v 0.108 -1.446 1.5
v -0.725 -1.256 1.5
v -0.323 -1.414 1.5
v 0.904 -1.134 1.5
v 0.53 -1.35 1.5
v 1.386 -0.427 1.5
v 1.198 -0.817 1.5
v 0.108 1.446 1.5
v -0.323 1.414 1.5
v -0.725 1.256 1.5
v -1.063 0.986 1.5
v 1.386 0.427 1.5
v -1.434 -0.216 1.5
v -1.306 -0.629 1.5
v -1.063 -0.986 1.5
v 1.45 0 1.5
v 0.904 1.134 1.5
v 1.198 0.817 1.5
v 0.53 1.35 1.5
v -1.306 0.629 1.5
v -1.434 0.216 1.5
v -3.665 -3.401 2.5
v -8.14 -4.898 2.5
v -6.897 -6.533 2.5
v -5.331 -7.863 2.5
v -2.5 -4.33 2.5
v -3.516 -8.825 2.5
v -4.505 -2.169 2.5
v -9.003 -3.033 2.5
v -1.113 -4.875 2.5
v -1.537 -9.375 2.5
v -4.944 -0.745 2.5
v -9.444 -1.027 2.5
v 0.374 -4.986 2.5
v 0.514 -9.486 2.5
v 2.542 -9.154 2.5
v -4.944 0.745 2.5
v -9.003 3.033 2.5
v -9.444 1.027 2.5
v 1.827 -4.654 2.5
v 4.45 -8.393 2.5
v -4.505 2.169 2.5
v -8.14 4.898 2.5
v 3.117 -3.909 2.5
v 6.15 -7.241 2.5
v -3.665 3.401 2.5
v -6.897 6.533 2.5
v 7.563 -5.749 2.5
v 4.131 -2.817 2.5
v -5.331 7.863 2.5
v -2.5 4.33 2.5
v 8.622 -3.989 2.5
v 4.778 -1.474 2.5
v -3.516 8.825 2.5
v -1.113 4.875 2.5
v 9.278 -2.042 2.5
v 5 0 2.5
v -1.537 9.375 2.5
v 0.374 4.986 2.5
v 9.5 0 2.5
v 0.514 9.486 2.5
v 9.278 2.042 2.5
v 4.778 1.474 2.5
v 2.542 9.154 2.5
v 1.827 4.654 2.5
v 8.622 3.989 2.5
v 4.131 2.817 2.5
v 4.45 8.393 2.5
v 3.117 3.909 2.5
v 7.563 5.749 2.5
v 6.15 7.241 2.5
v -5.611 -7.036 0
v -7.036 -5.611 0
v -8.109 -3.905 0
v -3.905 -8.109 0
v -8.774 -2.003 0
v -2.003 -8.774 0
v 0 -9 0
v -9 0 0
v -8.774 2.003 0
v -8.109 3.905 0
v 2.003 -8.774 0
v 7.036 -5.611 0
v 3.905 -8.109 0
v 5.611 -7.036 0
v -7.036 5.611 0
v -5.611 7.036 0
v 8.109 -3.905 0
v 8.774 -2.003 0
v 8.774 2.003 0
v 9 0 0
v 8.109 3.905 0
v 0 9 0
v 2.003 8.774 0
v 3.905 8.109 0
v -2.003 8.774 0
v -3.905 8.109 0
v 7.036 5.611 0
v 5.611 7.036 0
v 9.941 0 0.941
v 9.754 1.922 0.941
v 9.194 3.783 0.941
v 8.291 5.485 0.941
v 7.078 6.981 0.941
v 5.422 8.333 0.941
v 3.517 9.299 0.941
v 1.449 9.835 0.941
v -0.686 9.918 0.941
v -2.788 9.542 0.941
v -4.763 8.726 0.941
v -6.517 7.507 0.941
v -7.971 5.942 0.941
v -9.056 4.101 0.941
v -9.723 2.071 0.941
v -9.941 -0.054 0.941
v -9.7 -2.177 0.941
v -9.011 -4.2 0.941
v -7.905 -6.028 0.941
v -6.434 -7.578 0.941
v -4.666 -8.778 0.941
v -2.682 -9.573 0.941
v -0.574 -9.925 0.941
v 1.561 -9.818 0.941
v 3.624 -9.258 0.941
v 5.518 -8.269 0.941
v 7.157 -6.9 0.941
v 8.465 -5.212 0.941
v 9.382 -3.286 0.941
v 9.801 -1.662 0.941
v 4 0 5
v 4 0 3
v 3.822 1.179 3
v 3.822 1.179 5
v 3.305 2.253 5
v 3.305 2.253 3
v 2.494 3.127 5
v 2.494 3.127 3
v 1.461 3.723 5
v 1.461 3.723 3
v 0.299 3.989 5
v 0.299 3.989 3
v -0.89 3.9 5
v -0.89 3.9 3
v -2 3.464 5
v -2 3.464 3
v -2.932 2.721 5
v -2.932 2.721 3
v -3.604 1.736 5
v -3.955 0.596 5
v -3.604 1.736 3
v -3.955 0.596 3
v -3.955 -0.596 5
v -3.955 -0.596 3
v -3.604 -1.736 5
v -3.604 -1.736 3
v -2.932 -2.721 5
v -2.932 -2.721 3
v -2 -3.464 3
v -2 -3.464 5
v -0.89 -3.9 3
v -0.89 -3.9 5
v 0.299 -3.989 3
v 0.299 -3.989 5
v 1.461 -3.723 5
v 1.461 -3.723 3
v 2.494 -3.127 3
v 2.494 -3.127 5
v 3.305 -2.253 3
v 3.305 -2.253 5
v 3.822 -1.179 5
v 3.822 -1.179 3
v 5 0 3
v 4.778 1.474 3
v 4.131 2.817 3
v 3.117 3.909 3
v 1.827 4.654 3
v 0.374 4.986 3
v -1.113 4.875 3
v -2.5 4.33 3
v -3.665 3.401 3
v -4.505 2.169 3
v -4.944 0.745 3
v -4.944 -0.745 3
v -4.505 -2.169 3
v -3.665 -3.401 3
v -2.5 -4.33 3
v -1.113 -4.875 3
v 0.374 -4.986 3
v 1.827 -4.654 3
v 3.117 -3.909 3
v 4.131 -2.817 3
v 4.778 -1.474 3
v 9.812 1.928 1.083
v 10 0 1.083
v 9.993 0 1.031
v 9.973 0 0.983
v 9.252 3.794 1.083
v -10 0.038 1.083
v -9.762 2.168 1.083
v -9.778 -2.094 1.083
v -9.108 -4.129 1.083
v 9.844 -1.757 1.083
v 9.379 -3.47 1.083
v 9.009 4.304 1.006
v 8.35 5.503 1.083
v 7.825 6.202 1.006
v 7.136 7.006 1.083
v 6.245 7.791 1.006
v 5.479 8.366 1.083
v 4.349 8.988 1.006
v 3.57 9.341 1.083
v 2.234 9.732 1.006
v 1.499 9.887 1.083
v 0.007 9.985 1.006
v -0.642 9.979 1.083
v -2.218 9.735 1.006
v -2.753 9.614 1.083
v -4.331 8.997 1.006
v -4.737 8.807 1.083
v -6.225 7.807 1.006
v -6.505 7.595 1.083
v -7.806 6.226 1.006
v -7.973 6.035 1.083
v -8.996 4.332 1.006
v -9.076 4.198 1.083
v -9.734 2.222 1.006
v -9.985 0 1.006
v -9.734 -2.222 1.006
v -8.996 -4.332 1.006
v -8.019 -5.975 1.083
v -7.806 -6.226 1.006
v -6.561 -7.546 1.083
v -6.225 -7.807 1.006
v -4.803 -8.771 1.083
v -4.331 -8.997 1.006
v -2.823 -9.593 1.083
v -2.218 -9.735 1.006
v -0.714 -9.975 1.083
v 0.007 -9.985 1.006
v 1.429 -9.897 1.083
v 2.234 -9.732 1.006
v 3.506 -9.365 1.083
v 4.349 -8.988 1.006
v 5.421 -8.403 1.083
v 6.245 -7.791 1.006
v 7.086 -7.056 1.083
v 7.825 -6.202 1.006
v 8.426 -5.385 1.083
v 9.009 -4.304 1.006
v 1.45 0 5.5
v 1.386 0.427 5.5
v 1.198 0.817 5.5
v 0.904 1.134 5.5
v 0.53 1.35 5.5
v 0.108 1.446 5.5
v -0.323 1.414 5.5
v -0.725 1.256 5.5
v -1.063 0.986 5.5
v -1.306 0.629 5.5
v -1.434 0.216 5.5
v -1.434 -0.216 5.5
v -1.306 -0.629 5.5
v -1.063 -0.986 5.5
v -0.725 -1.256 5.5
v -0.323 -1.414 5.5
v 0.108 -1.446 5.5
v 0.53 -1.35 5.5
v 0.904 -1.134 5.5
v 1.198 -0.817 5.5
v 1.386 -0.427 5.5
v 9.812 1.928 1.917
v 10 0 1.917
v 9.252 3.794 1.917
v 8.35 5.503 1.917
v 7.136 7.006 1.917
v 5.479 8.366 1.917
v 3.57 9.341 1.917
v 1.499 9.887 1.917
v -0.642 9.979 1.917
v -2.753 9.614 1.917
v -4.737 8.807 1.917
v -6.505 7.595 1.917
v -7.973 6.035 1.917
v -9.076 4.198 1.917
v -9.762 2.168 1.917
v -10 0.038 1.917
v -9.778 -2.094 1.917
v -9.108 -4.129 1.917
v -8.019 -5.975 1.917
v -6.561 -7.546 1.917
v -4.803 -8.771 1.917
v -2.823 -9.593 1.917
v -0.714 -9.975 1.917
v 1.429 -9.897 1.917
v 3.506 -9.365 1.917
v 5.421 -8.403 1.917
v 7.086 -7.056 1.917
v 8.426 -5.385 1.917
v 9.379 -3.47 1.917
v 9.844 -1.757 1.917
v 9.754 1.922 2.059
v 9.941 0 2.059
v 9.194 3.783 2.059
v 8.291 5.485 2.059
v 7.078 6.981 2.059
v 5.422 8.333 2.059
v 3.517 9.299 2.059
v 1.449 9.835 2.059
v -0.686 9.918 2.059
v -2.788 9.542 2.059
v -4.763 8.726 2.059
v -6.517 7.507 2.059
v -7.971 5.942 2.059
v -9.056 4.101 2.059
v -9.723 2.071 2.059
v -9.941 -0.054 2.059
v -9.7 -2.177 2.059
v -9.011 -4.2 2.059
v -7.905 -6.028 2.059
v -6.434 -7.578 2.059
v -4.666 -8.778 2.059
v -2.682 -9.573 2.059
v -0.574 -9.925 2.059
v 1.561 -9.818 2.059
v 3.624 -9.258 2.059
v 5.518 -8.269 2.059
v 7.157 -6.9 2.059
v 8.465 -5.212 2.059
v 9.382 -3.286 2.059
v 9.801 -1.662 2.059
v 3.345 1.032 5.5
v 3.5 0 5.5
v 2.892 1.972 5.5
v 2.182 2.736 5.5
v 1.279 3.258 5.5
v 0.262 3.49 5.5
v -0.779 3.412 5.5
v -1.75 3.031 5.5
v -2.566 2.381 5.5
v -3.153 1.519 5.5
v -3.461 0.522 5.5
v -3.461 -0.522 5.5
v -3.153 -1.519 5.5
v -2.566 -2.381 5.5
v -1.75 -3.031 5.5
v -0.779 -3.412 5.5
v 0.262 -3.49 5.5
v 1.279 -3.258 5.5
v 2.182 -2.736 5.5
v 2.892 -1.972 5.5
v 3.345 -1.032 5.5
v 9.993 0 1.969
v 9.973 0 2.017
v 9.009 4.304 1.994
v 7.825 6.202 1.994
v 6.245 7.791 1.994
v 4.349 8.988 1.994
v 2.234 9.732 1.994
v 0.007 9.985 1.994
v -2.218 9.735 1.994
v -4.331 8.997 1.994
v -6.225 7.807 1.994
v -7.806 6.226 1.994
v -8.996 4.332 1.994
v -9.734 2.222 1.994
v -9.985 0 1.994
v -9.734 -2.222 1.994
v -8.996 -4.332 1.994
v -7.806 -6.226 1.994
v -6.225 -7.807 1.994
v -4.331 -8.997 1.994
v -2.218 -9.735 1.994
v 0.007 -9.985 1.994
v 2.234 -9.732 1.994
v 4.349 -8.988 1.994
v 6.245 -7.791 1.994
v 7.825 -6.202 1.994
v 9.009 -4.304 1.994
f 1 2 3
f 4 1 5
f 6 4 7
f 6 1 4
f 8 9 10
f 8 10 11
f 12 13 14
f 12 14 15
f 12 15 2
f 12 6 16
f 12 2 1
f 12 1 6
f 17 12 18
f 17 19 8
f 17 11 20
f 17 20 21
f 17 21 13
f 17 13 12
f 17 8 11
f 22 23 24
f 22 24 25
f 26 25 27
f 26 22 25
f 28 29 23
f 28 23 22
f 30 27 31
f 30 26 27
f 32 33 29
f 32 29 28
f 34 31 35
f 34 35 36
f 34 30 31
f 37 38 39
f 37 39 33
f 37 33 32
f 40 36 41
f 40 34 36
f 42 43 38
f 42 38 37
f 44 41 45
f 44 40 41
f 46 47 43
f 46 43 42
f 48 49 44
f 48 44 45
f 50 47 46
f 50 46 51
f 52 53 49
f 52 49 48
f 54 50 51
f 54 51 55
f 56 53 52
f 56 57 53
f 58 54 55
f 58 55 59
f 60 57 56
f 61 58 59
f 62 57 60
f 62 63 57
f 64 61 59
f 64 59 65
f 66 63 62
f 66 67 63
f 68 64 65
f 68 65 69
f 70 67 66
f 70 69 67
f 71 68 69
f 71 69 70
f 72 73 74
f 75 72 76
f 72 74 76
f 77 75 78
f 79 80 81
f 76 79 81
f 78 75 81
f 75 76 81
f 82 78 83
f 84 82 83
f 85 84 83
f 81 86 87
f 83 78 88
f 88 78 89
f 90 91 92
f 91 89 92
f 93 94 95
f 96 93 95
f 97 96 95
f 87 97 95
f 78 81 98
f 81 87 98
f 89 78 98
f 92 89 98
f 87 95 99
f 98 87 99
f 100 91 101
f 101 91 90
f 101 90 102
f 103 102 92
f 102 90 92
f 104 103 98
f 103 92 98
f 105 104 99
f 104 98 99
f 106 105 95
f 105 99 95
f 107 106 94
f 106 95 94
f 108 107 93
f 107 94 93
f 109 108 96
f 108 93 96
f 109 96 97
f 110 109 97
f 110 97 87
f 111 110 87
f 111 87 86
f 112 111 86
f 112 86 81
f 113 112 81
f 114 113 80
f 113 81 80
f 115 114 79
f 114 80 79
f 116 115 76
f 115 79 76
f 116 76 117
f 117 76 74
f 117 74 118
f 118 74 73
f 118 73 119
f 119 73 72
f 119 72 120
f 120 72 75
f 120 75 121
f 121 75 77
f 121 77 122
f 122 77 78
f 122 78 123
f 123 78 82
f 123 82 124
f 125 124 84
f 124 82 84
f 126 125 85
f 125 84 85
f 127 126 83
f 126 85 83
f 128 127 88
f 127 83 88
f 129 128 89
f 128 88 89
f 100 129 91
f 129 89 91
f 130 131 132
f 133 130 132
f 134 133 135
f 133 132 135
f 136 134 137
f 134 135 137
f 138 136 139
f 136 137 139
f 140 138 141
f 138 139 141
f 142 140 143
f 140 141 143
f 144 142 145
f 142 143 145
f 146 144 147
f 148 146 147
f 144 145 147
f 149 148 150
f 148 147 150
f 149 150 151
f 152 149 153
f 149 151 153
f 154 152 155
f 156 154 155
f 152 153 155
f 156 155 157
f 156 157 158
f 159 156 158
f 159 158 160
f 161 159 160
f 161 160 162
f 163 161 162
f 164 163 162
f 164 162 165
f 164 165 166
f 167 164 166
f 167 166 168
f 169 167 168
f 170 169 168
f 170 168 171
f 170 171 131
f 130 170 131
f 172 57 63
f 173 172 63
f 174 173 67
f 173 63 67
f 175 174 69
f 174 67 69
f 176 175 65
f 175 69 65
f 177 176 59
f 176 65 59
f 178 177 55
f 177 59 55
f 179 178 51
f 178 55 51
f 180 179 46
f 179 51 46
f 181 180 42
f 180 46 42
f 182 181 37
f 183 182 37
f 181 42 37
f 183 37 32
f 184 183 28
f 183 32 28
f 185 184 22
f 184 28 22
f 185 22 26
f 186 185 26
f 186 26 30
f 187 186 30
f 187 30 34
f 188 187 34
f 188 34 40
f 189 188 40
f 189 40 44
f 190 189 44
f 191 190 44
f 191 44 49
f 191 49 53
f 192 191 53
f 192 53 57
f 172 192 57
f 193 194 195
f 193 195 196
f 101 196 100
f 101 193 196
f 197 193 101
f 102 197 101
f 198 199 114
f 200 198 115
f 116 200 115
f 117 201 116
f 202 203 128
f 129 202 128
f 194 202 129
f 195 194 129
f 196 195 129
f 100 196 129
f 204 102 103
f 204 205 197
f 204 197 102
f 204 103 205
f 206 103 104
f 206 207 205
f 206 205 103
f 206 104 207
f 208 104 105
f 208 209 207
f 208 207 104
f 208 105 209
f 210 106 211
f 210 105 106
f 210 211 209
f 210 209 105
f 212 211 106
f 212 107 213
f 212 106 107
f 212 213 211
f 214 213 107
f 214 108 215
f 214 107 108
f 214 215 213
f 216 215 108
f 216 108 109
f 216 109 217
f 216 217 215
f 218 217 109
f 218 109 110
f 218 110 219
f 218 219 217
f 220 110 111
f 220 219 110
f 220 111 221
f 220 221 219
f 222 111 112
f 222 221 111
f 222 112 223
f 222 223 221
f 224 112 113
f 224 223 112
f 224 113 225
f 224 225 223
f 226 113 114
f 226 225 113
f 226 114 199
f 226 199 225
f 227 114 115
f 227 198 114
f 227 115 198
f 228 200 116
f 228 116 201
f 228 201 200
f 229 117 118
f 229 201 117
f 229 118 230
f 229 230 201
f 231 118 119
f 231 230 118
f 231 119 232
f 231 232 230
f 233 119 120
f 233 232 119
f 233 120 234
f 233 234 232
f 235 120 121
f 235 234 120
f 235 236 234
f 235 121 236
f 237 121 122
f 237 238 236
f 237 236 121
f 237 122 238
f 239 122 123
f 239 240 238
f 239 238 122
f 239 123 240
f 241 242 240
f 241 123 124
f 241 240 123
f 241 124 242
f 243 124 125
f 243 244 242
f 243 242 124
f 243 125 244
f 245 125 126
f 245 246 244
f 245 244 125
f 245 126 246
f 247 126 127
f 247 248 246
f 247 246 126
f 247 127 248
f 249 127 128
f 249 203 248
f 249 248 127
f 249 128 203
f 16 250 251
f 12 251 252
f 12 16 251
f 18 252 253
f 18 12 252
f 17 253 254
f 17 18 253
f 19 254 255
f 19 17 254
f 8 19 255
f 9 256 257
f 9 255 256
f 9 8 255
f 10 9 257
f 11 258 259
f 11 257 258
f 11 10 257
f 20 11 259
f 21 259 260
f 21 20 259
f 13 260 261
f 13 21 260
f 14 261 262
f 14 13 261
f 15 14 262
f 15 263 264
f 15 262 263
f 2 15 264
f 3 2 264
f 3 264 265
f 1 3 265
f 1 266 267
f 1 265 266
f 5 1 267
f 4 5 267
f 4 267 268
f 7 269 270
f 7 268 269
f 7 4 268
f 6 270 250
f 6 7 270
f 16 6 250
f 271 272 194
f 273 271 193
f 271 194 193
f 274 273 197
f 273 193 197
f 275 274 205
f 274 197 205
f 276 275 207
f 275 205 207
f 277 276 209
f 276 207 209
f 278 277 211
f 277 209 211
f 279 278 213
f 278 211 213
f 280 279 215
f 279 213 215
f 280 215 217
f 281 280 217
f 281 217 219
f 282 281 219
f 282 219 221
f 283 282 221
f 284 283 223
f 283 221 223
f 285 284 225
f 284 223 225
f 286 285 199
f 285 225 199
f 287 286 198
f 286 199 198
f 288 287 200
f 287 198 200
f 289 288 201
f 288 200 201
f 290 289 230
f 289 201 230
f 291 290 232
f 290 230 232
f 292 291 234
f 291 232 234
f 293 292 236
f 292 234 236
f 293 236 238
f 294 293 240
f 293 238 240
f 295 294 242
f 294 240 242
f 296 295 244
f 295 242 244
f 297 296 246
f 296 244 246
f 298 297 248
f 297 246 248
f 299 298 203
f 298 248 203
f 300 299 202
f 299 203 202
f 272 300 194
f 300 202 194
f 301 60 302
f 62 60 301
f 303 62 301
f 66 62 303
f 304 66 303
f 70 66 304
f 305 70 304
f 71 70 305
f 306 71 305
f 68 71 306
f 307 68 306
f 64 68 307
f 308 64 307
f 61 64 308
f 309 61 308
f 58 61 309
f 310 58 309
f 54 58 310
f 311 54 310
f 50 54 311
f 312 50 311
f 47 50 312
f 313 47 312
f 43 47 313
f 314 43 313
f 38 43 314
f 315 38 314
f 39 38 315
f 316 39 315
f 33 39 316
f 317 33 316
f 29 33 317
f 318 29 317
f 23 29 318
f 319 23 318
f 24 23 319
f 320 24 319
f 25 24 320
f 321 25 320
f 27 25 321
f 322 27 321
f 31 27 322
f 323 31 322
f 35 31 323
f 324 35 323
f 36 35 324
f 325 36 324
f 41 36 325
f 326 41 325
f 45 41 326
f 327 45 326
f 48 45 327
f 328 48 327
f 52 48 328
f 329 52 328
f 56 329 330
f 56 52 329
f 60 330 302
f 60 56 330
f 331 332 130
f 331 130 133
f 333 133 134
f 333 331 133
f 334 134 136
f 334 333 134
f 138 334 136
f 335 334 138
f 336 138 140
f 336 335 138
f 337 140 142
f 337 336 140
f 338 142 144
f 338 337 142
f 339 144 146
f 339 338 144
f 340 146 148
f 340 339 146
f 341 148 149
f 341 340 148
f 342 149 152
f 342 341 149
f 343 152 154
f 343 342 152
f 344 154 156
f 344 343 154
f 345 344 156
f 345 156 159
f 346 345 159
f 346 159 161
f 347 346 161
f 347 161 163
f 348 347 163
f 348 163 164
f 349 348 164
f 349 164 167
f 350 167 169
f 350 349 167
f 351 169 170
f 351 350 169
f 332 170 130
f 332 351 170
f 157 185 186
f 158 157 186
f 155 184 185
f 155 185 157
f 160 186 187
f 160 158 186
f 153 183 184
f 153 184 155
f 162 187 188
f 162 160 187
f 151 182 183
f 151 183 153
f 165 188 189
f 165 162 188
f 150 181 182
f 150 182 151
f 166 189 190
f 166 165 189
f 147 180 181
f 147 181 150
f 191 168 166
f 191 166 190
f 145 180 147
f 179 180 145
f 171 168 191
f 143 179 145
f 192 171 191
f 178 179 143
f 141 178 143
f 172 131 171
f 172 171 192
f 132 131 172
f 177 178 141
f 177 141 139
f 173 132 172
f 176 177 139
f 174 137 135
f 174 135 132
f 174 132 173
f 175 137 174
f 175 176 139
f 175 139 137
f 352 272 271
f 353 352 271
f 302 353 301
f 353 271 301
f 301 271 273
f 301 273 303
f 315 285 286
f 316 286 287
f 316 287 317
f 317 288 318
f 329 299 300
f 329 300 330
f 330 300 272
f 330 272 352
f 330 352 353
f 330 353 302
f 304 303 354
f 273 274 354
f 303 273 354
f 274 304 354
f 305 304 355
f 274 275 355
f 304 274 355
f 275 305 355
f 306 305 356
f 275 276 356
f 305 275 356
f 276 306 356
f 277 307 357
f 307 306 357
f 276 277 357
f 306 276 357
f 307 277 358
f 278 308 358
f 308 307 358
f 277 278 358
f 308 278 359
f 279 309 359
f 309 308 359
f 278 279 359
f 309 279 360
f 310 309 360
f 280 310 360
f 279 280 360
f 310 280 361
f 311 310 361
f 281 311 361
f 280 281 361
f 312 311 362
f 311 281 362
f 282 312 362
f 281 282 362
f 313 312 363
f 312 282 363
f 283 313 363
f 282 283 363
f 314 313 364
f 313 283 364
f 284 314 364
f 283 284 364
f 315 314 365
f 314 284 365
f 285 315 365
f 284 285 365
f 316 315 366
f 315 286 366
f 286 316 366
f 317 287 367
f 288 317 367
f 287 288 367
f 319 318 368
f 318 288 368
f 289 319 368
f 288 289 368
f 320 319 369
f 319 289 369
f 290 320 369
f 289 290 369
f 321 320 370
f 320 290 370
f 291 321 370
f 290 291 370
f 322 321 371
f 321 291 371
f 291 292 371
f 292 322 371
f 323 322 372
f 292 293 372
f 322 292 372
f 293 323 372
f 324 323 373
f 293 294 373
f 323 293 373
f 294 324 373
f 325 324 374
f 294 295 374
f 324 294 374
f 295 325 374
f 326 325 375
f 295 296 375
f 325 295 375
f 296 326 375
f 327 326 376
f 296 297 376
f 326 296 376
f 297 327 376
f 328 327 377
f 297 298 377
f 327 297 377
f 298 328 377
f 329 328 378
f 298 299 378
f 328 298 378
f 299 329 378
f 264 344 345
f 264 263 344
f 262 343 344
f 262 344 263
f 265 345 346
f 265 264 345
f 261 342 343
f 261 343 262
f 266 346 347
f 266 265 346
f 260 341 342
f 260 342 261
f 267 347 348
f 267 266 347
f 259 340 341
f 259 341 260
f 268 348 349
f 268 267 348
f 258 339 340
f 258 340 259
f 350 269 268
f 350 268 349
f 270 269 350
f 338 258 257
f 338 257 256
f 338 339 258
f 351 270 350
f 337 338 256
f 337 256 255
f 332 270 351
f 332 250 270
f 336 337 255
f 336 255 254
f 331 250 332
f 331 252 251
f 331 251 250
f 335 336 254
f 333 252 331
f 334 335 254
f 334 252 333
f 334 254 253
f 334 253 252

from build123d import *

# Parameters (mm, degrees)
F0_R      = 4
F1_DEPTH  = 5.5
F2_R      = 5
F3_DEPTH  = 3
F4_R      = 10
F5_DEPTH  = 2.5
F6_SIZE   = 1
F7_SIZE   = 0.5
F8_R      = 0.2
F9_SIZE   = 0.5
F12_START = 1.5
F11_R     = 1.45
F12_DEPTH = 10.1


with BuildPart() as f1:
    # F0 (on Top) → F1 (new body)
    with BuildSketch(Plane.XY):
        Circle(F0_R)
    extrude(amount=F1_DEPTH)

    # F2 (on Top) → F3 (join)
    with BuildSketch(Plane.XY):
        Circle(F2_R)
    extrude(amount=F3_DEPTH)

    # F4 (on Top) → F5 (join)
    with BuildSketch(Plane.XY):
        Circle(F4_R)
    extrude(amount=F5_DEPTH)

    # F6
    f6_edges = [f1.edges().sort_by_distance(p)[0] for p in [
        (-10, 0, 0),
    ]]
    chamfer(f6_edges, length=F6_SIZE)

    # F7
    f7_edges = [f1.edges().sort_by_distance(p)[0] for p in [
        (-10, 0, 2.5),
    ]]
    chamfer(f7_edges, length=F7_SIZE)

    # F8
    f8_edges = [f1.edges().sort_by_distance(p)[0] for p in [
        (-10, 0, 1),
        (-10, 0, 2),
    ]]
    fillet(f8_edges, radius=F8_R)

    # F9
    f9_edges = [f1.edges().sort_by_distance(p)[0] for p in [
        (-4, 0, 5.5),
    ]]
    chamfer(f9_edges, length=F9_SIZE)


with BuildPart() as f10_1:
    # F10: copy of F1
    add(f1.part.moved(Location((-25, 0, 0))))


with BuildPart() as f1_1:
    add(f1.part)

    # F11 (on Top) → F12 (cut)
    with BuildSketch(Plane.XY.offset(F12_START)):
        Circle(F11_R)
    extrude(amount=F12_DEPTH, mode=Mode.SUBTRACT)


with BuildPart() as f14_1:
    # F14: copy of F1
    add(f1_1.part.moved(Location((-23.4, 0, 0))))


solid = f1_1.part
